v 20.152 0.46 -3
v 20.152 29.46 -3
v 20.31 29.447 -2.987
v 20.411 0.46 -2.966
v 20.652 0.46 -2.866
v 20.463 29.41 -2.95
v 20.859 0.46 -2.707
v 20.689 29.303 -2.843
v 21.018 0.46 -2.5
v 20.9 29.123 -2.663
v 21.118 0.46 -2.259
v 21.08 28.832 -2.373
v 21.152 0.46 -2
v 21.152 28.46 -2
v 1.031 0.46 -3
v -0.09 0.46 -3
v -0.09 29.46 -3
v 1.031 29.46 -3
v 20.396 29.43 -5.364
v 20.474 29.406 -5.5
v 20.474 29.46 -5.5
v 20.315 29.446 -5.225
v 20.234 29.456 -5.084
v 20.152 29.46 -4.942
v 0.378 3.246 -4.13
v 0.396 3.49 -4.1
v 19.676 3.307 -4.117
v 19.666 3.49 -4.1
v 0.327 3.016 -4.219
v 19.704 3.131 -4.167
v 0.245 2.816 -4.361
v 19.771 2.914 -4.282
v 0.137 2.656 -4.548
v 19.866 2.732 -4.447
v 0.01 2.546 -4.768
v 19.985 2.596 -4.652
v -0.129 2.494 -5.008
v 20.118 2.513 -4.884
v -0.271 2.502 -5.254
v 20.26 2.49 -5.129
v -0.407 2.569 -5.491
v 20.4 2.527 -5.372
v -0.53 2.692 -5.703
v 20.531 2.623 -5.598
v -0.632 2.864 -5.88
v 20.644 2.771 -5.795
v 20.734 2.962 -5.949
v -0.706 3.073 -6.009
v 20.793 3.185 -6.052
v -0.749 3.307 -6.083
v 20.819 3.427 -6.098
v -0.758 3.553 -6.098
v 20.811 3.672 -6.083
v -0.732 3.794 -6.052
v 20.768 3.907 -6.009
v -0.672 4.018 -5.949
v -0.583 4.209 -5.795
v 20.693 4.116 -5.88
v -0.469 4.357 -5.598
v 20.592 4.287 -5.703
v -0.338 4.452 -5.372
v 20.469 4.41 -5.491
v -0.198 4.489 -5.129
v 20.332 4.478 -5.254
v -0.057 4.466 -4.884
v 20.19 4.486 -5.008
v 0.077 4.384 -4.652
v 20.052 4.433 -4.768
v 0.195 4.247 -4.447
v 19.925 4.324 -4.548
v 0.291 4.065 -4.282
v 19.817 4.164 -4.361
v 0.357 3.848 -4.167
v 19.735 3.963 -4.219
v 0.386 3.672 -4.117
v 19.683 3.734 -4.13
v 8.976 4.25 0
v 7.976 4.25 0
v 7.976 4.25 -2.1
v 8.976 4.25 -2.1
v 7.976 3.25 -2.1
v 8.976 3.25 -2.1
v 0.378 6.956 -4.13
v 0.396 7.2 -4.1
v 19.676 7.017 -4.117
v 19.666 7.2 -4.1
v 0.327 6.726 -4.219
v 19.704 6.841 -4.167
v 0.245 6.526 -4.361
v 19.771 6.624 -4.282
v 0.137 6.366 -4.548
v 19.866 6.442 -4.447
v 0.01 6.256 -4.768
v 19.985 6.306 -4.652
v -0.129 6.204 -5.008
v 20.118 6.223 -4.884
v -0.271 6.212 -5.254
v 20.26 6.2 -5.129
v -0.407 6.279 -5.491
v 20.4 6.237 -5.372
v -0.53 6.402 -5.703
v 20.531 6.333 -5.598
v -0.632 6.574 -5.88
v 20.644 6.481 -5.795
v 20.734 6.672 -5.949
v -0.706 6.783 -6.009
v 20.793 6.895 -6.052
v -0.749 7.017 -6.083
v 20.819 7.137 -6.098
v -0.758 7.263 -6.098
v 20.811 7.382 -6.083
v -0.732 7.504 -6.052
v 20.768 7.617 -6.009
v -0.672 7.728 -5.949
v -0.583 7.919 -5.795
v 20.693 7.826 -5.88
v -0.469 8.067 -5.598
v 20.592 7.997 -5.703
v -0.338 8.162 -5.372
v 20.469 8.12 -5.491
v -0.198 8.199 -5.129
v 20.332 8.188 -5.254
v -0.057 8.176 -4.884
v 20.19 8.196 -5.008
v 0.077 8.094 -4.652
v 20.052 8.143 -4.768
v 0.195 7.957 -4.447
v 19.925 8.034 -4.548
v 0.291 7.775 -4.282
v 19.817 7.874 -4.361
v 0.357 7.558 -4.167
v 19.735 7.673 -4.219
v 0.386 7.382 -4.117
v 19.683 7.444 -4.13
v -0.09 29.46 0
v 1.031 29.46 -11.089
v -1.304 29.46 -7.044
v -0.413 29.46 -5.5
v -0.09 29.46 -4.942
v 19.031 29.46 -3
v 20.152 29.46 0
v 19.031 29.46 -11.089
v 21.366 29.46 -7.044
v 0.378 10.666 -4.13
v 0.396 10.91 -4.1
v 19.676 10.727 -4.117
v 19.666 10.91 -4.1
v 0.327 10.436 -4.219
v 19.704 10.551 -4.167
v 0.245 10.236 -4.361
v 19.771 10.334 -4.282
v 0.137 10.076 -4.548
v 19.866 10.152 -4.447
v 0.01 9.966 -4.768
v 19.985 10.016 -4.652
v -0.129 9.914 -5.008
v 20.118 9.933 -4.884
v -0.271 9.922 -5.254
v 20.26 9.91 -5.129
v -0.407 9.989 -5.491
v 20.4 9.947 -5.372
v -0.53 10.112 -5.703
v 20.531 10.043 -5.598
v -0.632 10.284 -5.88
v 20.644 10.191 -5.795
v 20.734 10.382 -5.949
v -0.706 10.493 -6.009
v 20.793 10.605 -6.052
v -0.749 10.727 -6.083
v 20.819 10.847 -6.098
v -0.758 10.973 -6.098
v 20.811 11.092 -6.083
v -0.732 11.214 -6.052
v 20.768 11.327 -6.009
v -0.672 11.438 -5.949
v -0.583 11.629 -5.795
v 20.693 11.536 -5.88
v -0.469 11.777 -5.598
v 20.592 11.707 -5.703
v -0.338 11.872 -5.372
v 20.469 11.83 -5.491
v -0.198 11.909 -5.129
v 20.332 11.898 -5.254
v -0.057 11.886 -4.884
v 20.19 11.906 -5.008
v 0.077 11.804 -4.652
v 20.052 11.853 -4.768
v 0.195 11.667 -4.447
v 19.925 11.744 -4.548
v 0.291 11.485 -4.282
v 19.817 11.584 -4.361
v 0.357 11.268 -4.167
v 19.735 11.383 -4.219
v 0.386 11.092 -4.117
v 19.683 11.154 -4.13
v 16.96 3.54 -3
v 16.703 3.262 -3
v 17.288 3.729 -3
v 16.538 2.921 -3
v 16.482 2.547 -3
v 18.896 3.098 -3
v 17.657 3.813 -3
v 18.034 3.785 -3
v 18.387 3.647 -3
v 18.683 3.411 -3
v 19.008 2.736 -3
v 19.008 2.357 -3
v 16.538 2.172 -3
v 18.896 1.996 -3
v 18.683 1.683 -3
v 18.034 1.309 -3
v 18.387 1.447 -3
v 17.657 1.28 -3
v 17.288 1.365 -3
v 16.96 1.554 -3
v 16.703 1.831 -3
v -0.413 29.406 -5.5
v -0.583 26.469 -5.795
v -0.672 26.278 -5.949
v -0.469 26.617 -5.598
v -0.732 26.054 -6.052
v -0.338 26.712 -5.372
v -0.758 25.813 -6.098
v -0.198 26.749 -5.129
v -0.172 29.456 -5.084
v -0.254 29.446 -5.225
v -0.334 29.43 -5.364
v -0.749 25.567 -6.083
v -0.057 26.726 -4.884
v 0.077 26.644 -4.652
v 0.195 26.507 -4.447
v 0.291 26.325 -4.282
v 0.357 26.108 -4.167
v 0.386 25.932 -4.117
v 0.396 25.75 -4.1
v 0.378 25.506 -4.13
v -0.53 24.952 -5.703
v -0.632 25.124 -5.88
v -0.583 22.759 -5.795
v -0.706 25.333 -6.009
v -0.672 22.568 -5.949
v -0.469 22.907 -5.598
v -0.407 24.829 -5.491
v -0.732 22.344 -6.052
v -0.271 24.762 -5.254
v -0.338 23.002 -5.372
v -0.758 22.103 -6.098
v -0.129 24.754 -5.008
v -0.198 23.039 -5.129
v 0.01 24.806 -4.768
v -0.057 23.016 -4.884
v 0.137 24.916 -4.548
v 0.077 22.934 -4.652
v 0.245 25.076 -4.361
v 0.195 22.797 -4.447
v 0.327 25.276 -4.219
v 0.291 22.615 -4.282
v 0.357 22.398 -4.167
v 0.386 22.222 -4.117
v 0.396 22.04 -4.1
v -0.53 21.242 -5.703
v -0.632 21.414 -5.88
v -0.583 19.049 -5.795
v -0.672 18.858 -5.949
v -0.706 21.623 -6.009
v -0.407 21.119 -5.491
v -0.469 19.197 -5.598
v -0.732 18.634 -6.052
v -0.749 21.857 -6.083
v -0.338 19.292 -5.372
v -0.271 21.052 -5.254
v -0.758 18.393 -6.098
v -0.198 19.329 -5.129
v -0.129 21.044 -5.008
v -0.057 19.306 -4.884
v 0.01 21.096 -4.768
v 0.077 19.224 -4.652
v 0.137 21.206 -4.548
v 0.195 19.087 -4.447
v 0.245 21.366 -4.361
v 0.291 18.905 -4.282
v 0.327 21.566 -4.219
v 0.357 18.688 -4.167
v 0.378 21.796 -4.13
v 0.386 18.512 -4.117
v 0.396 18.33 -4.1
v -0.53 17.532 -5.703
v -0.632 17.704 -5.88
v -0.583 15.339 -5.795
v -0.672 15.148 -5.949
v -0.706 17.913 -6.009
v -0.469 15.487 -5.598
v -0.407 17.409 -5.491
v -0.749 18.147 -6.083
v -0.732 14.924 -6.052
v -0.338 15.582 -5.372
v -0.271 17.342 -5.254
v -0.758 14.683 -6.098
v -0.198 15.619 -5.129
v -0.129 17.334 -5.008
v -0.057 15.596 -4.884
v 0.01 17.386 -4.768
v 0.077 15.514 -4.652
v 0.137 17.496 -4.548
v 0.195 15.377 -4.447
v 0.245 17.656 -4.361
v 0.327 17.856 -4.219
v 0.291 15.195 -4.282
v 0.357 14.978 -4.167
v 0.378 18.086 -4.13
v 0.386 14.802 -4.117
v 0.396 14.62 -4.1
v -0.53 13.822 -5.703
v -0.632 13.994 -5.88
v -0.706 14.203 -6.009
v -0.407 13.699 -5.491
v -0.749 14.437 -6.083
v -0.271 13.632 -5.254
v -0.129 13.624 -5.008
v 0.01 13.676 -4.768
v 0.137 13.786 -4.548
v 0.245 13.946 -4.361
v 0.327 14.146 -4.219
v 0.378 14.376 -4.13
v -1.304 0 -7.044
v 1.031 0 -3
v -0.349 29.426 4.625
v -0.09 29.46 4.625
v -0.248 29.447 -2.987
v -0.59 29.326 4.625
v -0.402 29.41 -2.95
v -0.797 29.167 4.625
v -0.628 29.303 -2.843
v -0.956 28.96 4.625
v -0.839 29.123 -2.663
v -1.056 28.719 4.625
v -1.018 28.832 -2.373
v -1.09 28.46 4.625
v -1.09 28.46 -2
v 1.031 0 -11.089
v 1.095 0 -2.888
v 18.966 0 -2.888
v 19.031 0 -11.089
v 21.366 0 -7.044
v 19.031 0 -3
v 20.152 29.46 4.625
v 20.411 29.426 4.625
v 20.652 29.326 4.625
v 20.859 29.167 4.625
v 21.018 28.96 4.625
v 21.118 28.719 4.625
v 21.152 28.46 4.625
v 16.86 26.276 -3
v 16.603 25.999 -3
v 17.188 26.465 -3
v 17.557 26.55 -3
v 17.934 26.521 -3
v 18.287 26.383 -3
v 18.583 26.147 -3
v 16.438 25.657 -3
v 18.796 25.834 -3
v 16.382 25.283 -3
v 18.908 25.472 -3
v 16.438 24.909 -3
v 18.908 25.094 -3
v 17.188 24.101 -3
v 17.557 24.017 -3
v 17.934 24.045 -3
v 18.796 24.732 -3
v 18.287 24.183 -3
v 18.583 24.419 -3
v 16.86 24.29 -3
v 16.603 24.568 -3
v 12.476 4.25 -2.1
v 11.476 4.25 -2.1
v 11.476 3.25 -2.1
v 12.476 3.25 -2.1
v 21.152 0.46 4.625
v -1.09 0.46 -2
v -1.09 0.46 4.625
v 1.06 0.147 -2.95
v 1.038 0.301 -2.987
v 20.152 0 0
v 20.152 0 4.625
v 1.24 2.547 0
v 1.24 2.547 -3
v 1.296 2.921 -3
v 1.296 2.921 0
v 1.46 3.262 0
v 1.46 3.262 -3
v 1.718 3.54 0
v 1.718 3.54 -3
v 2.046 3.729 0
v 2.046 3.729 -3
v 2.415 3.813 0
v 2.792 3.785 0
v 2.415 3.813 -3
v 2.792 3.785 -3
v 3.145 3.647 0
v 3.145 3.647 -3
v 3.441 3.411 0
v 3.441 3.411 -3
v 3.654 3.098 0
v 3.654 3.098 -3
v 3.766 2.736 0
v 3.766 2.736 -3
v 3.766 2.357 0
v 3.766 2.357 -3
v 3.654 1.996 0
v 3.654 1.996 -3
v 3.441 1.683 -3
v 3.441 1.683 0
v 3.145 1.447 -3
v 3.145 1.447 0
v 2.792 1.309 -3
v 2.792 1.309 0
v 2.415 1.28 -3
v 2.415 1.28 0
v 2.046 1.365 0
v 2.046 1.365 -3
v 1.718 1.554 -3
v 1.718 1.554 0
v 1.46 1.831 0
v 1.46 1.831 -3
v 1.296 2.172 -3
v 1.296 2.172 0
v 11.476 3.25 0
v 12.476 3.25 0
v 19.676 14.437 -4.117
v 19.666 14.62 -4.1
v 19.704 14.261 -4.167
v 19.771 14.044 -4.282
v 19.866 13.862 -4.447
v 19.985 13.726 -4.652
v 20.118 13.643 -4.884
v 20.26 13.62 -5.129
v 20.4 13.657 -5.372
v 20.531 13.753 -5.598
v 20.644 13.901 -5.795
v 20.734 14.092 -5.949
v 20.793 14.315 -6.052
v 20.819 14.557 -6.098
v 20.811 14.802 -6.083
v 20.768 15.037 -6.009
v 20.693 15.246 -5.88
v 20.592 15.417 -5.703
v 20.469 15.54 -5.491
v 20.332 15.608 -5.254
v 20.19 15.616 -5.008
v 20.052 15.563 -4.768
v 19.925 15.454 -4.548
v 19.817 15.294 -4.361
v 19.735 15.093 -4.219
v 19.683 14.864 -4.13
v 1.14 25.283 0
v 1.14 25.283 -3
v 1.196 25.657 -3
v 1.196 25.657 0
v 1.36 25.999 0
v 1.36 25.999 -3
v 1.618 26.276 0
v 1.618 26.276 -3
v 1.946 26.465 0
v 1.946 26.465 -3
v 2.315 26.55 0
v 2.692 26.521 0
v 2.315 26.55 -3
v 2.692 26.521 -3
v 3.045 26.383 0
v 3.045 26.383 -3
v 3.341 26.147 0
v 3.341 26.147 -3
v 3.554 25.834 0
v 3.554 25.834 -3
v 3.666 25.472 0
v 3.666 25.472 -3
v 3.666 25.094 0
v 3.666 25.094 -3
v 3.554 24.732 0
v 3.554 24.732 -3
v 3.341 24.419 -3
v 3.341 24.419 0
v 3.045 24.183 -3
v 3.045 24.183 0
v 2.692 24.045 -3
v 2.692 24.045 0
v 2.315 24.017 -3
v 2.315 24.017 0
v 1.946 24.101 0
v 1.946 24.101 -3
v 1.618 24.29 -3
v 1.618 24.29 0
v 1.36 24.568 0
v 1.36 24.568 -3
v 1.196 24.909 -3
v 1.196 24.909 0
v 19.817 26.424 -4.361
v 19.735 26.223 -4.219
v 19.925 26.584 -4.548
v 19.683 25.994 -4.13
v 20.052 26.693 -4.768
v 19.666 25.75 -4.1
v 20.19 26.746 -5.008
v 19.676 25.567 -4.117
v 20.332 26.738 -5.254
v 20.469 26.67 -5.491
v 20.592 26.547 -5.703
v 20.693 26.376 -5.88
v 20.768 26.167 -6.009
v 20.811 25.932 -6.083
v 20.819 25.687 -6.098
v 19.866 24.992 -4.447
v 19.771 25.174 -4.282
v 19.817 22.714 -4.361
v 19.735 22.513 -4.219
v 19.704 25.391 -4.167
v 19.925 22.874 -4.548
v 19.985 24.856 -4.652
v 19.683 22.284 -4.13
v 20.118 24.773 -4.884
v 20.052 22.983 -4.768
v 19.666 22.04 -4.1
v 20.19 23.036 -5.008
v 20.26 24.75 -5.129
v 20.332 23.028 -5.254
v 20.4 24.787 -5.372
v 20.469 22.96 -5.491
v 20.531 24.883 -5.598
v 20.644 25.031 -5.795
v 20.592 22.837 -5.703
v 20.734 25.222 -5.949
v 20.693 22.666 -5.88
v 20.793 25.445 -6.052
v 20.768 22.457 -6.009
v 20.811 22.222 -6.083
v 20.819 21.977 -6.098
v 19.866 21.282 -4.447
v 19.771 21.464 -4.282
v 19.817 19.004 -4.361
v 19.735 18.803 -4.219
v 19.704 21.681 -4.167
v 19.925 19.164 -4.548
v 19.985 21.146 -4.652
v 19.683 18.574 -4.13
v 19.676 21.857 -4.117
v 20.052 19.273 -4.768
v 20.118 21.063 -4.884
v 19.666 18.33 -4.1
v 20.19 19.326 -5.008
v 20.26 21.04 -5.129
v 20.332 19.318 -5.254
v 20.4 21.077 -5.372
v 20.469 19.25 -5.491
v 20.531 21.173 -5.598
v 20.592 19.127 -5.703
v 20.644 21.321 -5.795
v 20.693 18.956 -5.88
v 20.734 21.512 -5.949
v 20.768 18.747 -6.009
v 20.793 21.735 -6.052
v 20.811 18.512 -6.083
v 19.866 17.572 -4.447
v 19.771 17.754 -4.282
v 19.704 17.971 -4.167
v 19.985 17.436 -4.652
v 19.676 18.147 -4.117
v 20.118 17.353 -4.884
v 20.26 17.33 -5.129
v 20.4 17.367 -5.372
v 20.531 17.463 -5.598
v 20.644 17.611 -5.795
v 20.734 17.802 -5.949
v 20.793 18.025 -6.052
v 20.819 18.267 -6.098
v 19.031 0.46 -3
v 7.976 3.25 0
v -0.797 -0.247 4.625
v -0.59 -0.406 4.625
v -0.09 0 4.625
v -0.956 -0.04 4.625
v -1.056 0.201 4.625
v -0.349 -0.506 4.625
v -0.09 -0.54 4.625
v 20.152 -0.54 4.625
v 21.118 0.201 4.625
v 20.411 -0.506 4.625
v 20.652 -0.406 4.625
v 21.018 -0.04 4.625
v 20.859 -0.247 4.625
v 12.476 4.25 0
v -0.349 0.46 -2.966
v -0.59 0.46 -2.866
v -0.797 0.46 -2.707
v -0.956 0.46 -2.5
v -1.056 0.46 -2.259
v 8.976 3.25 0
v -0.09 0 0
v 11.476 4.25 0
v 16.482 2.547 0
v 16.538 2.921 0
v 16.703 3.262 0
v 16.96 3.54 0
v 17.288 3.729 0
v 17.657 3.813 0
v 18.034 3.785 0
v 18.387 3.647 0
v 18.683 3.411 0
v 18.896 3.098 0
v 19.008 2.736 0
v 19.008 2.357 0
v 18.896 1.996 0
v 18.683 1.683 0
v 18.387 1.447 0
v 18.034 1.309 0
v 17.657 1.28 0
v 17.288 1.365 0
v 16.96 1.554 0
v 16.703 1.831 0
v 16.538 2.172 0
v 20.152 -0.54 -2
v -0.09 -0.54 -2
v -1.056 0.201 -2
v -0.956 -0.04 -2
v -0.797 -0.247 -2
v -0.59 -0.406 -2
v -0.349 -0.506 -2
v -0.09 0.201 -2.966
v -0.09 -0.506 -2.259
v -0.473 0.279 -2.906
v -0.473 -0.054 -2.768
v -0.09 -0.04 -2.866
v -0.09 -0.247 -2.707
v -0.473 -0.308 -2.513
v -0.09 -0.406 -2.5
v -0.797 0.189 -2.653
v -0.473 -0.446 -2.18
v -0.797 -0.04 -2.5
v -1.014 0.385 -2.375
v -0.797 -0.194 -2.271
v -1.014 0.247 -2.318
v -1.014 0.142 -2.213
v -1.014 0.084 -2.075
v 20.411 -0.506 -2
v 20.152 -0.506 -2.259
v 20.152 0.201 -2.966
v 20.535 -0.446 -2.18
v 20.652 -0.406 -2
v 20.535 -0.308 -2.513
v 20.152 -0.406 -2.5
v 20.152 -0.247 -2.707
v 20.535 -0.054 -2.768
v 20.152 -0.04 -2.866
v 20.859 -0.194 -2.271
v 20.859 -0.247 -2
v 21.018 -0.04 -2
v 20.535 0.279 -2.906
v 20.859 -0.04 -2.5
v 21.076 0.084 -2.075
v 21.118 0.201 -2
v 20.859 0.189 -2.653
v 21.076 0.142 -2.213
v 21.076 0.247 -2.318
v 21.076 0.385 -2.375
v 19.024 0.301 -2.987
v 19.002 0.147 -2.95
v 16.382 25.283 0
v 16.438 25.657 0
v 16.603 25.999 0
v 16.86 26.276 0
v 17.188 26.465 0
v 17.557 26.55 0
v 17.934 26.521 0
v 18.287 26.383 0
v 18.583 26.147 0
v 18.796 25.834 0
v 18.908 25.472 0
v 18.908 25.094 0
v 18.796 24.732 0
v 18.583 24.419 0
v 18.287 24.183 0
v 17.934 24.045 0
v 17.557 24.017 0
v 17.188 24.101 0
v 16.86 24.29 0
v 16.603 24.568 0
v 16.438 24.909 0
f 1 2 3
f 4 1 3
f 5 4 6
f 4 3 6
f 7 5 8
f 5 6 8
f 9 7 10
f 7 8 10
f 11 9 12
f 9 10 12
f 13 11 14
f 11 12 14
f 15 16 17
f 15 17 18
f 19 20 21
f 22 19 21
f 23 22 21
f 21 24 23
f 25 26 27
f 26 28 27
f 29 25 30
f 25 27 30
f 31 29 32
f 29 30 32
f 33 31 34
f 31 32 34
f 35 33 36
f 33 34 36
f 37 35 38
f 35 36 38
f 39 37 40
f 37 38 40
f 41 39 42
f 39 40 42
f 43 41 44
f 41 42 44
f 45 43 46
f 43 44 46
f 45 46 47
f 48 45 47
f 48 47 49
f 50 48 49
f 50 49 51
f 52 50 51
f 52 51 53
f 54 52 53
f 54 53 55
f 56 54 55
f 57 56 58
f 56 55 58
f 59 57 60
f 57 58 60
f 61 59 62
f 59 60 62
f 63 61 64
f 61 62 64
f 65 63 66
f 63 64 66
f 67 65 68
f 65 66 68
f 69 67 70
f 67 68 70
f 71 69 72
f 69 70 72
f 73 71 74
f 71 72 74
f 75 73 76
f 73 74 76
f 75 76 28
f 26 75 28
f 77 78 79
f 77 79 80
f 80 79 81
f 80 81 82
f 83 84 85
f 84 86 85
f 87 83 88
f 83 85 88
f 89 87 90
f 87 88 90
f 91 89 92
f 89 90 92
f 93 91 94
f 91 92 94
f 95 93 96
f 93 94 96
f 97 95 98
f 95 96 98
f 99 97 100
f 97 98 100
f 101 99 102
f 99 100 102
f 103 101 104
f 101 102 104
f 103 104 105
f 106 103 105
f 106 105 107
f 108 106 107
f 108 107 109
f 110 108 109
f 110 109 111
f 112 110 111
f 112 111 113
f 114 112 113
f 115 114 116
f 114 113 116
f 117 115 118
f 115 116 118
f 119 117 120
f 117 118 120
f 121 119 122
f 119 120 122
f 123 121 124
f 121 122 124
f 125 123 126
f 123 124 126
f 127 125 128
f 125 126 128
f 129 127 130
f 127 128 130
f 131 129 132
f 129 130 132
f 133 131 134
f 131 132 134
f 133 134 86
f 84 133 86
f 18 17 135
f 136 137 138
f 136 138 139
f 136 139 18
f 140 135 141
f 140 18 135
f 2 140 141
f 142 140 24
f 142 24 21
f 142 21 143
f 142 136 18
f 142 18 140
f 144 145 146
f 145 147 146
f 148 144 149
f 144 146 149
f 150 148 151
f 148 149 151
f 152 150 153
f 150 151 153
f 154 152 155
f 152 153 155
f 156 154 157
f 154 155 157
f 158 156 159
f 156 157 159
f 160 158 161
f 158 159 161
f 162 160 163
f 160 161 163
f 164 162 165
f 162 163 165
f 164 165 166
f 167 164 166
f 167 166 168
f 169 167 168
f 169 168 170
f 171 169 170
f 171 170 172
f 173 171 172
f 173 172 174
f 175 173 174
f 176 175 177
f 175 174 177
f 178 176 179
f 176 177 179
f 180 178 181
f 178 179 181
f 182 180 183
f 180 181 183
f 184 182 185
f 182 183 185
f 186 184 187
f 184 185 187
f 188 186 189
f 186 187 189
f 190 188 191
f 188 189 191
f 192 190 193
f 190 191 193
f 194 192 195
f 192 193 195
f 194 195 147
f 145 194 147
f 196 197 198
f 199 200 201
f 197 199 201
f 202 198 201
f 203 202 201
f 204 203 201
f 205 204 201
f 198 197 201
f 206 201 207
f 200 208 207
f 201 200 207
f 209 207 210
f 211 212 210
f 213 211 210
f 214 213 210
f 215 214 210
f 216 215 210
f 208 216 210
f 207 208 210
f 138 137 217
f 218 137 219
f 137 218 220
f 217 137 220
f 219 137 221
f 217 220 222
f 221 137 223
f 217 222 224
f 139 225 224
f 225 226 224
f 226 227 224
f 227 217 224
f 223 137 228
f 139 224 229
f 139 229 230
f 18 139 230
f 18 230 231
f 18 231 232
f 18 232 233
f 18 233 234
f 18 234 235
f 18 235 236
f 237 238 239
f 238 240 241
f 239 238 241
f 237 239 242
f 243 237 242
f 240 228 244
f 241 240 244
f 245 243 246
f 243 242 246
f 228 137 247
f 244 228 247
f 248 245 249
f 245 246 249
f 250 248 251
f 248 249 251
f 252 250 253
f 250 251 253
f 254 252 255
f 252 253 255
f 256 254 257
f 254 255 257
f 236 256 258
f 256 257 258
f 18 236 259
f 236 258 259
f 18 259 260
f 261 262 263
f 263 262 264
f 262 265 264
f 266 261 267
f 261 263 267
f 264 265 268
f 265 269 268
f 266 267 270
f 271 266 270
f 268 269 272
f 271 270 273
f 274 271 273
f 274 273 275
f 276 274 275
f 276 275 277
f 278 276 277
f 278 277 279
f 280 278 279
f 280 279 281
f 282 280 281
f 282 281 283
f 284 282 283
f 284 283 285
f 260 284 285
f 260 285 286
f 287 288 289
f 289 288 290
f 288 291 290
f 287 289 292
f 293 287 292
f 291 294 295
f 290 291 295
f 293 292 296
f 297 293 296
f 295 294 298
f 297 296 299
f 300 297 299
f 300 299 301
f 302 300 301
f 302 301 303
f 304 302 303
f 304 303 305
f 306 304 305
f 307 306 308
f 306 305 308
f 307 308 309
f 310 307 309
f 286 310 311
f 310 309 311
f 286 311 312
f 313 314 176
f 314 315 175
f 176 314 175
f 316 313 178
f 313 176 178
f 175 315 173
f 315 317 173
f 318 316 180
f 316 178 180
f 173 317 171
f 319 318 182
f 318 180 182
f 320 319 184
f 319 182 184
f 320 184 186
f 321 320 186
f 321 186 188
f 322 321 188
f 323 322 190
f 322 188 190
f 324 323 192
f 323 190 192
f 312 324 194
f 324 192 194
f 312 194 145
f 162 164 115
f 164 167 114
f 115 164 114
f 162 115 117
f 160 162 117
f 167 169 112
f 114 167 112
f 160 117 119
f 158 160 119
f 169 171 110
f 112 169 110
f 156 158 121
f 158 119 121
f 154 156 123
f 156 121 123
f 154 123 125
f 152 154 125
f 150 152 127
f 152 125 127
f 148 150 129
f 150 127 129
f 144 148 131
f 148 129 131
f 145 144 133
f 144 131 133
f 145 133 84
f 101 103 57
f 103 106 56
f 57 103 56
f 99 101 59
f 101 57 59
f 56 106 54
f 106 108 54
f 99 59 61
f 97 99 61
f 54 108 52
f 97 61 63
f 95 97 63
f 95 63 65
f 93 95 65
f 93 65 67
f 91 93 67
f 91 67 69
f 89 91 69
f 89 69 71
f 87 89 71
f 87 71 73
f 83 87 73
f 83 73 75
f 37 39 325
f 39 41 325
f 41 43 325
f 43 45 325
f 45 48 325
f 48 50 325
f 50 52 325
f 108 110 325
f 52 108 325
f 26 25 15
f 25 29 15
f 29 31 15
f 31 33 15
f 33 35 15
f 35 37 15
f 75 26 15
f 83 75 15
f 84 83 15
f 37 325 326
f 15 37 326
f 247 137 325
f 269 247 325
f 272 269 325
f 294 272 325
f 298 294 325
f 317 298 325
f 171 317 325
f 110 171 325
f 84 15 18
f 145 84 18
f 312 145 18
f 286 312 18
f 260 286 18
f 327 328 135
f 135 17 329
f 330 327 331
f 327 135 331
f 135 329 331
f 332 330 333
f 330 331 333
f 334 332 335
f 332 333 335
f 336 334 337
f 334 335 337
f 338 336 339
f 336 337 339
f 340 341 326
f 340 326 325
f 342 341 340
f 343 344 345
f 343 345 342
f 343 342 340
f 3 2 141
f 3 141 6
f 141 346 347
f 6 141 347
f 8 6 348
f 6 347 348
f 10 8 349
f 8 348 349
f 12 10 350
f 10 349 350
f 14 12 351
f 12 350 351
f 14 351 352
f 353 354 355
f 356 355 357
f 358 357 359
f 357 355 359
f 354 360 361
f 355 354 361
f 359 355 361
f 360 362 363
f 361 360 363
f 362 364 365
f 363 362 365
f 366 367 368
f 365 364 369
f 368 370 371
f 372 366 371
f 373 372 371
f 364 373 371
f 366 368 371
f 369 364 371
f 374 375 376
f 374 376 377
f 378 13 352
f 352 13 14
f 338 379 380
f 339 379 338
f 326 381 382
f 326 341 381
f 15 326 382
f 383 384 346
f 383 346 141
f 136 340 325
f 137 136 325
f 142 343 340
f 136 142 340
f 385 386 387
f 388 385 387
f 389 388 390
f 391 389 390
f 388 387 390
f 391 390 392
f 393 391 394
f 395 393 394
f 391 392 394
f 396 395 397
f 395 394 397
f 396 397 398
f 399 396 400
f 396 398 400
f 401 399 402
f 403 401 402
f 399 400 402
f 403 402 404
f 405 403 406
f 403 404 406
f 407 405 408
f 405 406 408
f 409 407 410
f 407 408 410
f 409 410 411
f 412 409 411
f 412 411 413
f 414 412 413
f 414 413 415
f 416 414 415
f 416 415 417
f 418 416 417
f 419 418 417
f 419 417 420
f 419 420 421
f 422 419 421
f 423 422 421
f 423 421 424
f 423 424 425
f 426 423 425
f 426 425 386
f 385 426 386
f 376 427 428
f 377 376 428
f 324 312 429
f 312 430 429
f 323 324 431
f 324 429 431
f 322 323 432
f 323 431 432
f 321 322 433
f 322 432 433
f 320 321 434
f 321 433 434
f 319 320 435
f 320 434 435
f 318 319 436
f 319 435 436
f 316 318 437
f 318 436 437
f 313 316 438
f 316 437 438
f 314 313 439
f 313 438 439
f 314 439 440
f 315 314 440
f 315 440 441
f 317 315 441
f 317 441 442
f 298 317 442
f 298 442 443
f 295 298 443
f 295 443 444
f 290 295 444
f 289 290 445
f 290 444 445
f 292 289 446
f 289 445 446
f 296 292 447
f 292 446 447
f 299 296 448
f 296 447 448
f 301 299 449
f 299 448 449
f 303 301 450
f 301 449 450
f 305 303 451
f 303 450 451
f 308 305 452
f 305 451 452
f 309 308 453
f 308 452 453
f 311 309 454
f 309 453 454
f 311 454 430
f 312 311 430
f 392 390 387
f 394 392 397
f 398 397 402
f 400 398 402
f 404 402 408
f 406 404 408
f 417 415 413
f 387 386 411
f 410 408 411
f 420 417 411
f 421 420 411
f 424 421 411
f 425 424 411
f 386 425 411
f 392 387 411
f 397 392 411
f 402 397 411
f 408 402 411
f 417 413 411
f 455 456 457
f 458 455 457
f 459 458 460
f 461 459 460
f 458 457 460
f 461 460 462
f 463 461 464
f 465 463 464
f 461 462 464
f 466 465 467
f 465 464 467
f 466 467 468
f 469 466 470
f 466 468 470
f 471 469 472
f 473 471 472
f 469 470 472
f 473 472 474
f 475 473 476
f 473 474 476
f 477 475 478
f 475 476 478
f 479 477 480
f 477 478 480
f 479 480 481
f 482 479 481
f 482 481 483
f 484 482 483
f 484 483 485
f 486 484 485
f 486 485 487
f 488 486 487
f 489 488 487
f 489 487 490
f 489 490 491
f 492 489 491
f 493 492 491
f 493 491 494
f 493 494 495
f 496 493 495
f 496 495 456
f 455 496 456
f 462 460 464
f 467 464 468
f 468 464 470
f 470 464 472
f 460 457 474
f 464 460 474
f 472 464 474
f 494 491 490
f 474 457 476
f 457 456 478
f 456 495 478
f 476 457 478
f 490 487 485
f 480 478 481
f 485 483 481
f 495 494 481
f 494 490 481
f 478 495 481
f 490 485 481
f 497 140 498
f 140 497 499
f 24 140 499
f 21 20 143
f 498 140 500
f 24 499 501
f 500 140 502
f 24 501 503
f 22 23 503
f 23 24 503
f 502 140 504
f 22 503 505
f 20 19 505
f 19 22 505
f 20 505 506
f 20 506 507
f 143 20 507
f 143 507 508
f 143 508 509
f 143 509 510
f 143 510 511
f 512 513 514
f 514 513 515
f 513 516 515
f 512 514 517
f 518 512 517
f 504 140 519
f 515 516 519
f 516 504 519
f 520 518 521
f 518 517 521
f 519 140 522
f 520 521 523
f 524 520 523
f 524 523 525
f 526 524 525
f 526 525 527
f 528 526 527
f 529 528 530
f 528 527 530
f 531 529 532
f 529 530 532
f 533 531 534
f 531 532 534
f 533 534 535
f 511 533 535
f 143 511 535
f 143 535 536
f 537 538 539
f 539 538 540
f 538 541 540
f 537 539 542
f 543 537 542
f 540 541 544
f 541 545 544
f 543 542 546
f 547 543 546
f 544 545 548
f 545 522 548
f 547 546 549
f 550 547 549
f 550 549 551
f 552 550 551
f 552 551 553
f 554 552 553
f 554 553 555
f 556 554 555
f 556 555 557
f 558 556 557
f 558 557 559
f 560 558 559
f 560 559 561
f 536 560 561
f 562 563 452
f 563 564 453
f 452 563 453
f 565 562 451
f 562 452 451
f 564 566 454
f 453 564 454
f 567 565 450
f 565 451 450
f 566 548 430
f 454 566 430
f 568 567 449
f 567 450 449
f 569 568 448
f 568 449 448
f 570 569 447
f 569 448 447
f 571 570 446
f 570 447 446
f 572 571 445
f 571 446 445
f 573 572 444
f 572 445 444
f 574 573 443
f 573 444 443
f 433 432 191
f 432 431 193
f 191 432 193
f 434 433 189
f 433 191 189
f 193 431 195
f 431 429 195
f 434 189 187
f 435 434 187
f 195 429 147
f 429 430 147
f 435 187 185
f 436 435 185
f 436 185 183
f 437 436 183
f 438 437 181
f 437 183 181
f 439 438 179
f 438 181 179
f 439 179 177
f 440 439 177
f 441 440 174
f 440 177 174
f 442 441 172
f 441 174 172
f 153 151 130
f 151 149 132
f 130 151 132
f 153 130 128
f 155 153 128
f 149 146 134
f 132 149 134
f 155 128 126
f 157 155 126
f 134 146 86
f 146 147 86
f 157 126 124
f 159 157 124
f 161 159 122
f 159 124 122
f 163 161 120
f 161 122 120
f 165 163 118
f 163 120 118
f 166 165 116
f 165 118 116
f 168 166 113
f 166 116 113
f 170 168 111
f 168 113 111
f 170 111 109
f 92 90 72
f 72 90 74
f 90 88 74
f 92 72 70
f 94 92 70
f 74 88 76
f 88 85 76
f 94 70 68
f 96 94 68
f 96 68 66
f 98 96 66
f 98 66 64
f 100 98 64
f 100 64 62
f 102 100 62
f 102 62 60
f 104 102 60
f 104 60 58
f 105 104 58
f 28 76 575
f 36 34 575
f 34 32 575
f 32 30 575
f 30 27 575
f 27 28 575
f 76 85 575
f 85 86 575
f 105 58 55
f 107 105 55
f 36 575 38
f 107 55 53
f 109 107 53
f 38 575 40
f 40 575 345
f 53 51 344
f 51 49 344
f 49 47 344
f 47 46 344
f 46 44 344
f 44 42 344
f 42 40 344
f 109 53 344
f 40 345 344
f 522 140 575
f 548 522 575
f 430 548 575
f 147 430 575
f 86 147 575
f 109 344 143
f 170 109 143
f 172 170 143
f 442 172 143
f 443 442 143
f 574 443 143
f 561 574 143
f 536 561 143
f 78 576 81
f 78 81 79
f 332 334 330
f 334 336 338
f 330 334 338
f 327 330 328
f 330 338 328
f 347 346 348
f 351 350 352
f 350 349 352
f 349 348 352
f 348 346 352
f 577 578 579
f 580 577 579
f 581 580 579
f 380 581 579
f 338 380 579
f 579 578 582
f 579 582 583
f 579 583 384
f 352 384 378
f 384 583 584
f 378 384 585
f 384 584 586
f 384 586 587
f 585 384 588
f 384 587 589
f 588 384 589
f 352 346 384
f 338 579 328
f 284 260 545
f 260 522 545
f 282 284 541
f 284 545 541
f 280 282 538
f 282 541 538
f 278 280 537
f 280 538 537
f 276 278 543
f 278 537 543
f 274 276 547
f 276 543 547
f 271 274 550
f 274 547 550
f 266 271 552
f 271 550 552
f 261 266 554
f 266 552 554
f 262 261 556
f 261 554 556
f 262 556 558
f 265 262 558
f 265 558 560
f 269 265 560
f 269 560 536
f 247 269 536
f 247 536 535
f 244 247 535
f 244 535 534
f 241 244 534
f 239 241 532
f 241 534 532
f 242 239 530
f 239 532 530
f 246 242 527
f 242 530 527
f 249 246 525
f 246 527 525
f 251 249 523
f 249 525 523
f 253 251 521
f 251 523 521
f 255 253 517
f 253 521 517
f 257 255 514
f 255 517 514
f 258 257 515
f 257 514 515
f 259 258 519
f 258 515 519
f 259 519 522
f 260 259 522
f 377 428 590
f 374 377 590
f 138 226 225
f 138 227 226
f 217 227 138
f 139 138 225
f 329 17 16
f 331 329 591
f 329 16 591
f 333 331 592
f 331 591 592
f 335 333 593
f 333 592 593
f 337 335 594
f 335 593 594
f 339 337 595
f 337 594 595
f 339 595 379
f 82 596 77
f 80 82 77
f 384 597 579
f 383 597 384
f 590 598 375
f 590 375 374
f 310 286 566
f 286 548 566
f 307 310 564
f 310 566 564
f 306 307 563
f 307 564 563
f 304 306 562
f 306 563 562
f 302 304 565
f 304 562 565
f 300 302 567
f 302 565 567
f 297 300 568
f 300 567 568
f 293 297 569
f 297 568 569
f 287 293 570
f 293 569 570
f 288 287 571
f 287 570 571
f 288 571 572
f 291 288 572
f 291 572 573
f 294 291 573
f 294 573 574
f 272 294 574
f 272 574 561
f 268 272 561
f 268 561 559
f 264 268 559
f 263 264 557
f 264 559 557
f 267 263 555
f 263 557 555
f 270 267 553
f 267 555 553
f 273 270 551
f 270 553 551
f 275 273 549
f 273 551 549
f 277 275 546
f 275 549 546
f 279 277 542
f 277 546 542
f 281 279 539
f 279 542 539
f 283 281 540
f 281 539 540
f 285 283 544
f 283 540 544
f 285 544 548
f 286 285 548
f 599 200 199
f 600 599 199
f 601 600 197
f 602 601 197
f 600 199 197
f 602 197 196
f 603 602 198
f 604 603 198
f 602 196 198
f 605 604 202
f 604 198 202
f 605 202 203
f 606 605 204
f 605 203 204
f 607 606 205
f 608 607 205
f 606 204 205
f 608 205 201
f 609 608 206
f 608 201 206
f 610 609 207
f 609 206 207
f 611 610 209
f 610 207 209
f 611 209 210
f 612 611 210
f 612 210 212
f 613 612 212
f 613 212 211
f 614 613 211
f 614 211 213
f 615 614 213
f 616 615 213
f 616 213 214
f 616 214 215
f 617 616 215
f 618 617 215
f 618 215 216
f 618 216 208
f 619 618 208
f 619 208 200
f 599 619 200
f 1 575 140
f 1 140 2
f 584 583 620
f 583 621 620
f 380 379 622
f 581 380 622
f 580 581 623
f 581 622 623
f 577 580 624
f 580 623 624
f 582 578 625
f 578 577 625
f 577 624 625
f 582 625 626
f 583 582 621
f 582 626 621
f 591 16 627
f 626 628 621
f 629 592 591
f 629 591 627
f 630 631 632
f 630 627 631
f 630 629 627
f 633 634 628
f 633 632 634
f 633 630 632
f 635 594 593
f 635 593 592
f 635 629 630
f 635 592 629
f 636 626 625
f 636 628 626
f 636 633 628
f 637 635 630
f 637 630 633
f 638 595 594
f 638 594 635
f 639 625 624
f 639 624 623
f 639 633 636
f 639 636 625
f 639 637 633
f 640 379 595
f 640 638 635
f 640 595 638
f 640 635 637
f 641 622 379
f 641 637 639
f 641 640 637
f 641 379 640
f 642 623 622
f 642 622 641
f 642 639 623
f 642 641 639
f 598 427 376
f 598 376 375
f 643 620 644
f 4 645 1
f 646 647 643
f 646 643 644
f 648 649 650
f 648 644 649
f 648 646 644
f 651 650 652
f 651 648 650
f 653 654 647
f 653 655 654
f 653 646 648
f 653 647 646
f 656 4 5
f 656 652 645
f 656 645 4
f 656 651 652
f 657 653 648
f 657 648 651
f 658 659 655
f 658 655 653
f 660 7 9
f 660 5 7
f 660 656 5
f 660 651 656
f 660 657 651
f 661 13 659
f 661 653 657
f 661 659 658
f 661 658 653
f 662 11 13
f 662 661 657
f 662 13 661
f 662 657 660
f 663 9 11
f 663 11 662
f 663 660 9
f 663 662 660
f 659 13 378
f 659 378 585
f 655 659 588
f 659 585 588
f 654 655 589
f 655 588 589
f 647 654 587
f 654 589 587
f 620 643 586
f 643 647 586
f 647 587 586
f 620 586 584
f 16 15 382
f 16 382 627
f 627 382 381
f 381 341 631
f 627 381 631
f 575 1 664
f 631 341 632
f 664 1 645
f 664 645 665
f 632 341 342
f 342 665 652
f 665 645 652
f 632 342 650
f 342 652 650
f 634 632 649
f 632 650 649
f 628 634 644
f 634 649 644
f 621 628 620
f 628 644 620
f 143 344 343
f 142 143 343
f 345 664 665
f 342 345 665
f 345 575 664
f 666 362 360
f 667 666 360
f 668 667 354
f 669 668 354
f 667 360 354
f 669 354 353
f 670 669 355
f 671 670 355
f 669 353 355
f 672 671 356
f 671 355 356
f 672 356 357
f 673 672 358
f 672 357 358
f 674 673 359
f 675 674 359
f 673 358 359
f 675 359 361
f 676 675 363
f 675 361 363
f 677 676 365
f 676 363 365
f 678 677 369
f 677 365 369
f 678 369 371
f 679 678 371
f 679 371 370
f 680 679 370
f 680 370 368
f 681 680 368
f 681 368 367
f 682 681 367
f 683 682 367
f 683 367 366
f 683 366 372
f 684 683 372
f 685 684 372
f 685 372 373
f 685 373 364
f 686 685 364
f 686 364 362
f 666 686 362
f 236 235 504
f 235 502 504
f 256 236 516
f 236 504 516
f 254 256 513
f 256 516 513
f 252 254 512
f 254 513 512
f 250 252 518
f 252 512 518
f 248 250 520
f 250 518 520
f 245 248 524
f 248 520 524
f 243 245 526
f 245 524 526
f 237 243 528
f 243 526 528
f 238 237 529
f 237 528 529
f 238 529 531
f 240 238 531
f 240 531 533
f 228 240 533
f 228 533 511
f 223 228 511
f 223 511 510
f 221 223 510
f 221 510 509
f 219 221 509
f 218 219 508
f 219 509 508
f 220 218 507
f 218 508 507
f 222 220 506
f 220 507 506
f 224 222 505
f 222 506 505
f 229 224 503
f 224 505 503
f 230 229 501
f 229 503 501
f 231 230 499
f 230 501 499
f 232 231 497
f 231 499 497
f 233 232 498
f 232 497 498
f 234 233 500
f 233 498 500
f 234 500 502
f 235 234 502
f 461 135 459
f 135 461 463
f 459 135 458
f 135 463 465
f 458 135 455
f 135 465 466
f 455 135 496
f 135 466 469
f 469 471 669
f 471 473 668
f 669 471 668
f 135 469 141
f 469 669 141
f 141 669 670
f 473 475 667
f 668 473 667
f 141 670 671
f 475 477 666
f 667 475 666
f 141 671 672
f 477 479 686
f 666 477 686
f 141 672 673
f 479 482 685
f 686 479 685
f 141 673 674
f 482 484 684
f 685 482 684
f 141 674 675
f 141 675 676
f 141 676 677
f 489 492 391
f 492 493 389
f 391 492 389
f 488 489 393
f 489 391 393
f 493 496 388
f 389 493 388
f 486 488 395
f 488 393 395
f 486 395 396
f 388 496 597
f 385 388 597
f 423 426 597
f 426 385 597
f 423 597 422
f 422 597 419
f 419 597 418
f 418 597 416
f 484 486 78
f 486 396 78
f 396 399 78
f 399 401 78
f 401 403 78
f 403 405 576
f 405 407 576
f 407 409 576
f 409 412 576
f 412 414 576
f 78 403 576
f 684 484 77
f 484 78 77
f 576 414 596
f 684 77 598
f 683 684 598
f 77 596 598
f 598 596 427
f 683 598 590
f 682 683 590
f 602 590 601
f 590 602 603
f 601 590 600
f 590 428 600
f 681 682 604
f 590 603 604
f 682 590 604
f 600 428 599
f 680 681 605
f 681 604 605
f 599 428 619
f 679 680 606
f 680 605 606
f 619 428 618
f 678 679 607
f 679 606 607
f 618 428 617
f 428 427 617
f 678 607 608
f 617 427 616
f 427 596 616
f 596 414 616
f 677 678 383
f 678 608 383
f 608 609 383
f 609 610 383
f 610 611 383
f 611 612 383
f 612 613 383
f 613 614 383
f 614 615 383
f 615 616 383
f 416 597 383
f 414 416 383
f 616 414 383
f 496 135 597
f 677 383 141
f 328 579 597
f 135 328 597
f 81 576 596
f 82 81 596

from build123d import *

# Parameters (mm, degrees)
BOSS_EXTRUDE1_DEPTH      = 13
BOSS_EXTRUDE1_DEPTH_BACK = 3
SKETCH1_W                = 22.242116592
SKETCH1_H                = 30
SKETCH4_W                = 20.242116592
SKETCH4_H                = 12
CUT_EXTRUDE1_DEPTH       = 33
SKETCH3_W                = 1
SKETCH3_H                = 1
CUT_EXTRUDE2_DEPTH       = 2.1
SKETCH6_R                = 1.27
CUT_EXTRUDE3_DEPTH       = 3.1
BOSS_EXTRUDE3_DEPTH      = 29.459732878
SKETCH8_R                = 1
CUT_EXTRUDE4_DEPTH       = 39.644200609
LPATTERN1_COUNT          = 7
LPATTERN1_PITCH          = 3.71
FILLET2_R                = 1
OPTIONALCUT_DEPTH        = 39.644200609
OPTIONALCUT_DEPTH_BACK   = 39.644200609
SKETCH9_W                = 34.001532977
SKETCH9_H                = 12.141543576


with BuildPart() as part:
    # Sketch1 → Boss-Extrude1 (new, two sides: drawn at the far end of the back side and taken through both)
    with BuildSketch(Plane.XY.offset(-BOSS_EXTRUDE1_DEPTH_BACK)):
        with Locations((10.030822696, 14.459732878)):
            Rectangle(SKETCH1_W, SKETCH1_H)
    extrude(amount=BOSS_EXTRUDE1_DEPTH + BOSS_EXTRUDE1_DEPTH_BACK)

    # Sketch4 → Cut-Extrude1 (cut)
    with BuildSketch(Plane(origin=(0, 0, 0), x_dir=(1, 0, 0), z_dir=(0, 1, 0))):
        with Locations((10.030822696, -6)):
            Rectangle(SKETCH4_W, SKETCH4_H)
    extrude(amount=CUT_EXTRUDE1_DEPTH, mode=Mode.SUBTRACT)

    # Sketch3 → Cut-Extrude2 (cut)
    with BuildSketch(Plane.XY):
        with Locations((11.976170858, 3.750395558)):
            Rectangle(SKETCH3_W, SKETCH3_H)
        with Locations((8.476170858, 3.750395558)):
            Rectangle(SKETCH3_W, SKETCH3_H)
    extrude(amount=-CUT_EXTRUDE2_DEPTH, mode=Mode.SUBTRACT)

    # Sketch6 → Cut-Extrude3 (cut)
    with BuildSketch(Plane(origin=(0, 0, -3), x_dir=(-1, 0, 0), z_dir=(0, 0, -1))):
        with Locations((-17.651880992, 25.283129292)):
            Circle(SKETCH6_R)
        with Locations((-2.4097644, 25.283129292)):
            Circle(SKETCH6_R)
        with Locations((-17.751880992, 2.54676855)):
            Circle(SKETCH6_R)
        with Locations((-2.5097644, 2.54676855)):
            Circle(SKETCH6_R)
    extrude(amount=-CUT_EXTRUDE3_DEPTH, mode=Mode.SUBTRACT)

    # Sketch7 → Boss-Extrude3 (add)
    with BuildSketch(Plane(origin=(0, 0, 0), x_dir=(1, 0, 0), z_dir=(0, 1, 0))):
        Polygon((1.030822696, 3), (19.030822696, 3), (21.365822696, 7.044338636), (19.030822696, 11.088677271), (1.030822696, 11.088677271), (-1.304177304, 7.044338636), align=None)
    extrude(amount=BOSS_EXTRUDE3_DEPTH)

    # Sketch8 → Cut-Extrude4 (cut, symmetric)
    with BuildSketch(Plane(origin=(0, 0, 0), x_dir=(0, 0, -1), z_dir=(1, 0, 0))):
        with Locations(Location((5.1, 25.749732878, 0), (0, 0, 180))):
            Circle(SKETCH8_R)
    cut_extrude4 = extrude(amount=CUT_EXTRUDE4_DEPTH, both=True, mode=Mode.SUBTRACT)

    # LPattern1: Cut-Extrude4 ×7
    with Locations(*[(0, -i * LPATTERN1_PITCH, 0) for i in range(1, LPATTERN1_COUNT)]):
        add(cut_extrude4, mode=Mode.SUBTRACT)

    # Fillet2
    # the kernel refuses this fillet: 1 mm, written as the material it takes off along each edge
    with BuildSketch(Plane(origin=(20.151880992, 0.459732878, -2), x_dir=(0, 0, -1), z_dir=(1, 0, 0))) as fillet2_piece_1_section:
        Polygon((0, 0), (FILLET2_R * 1.02, 0), (FILLET2_R * 1.02, -FILLET2_R * 1.02), (0, -FILLET2_R * 1.02), align=None)
    fillet2_piece_1 = extrude(amount=FILLET2_R * 1.02, mode=Mode.PRIVATE)
    fillet2_piece_1 = fillet2_piece_1 - Plane(origin=(20.151880992, 0.459732878, -2), x_dir=(0, 0.7071067811865475, 0.7071067811865475), z_dir=(1, 0, 0)) * Sphere(FILLET2_R, mode=Mode.PRIVATE)
    add(fillet2_piece_1, mode=Mode.SUBTRACT)
    with BuildSketch(Plane(origin=(-0.0902356, 0.459732878, -2), x_dir=(0, 0, -1), z_dir=(-1, 0, 0))) as fillet2_piece_2_section:
        Polygon((0, 0), (FILLET2_R * 1.02, 0), (FILLET2_R * 1.02, FILLET2_R * 1.02), (0, FILLET2_R * 1.02), align=None)
    fillet2_piece_2 = extrude(amount=FILLET2_R * 1.02, mode=Mode.PRIVATE)
    fillet2_piece_2 = fillet2_piece_2 - Plane(origin=(-0.0902356, 0.459732878, -2), x_dir=(0, 0.7071067811865475, 0.7071067811865475), z_dir=(-1, 0, 0)) * Sphere(FILLET2_R, mode=Mode.PRIVATE)
    add(fillet2_piece_2, mode=Mode.SUBTRACT)
    with BuildSketch(Plane(origin=(20.151880992, 0.459732878, 12), x_dir=(1, 0, 0), z_dir=(0, 0, 1))) as fillet2_piece_3_section:
        Polygon((0, 0), (FILLET2_R * 1.02, 0), (FILLET2_R * 1.02, -FILLET2_R * 1.02), (0, -FILLET2_R * 1.02), align=None)
    fillet2_piece_3 = extrude(amount=FILLET2_R * 1.02, mode=Mode.PRIVATE)
    fillet2_piece_3 = fillet2_piece_3 - Plane(origin=(20.151880992, 0.459732878, 12), x_dir=(-0.7071067811865476, 0.7071067811865475, 0), z_dir=(0, 0, 1)) * Sphere(FILLET2_R, mode=Mode.PRIVATE)
    add(fillet2_piece_3, mode=Mode.SUBTRACT)
    with BuildSketch(Plane(origin=(-0.0902356, 0.459732878, 12), x_dir=(0, -1, 0), z_dir=(0, 0, 1))) as fillet2_piece_4_section:
        Polygon((0, 0), (FILLET2_R * 1.02, 0), (FILLET2_R * 1.02, -FILLET2_R * 1.02), (0, -FILLET2_R * 1.02), align=None)
    fillet2_piece_4 = extrude(amount=FILLET2_R * 1.02, mode=Mode.PRIVATE)
    fillet2_piece_4 = fillet2_piece_4 - Plane(origin=(-0.0902356, 0.459732878, 12), x_dir=(0.7071067811865475, 0.7071067811865477, 0), z_dir=(0, 0, 1)) * Sphere(FILLET2_R, mode=Mode.PRIVATE)
    add(fillet2_piece_4, mode=Mode.SUBTRACT)
    with BuildSketch(Plane(origin=(-0.0902356, 28.459732878, 12), x_dir=(-1, 0, 0), z_dir=(0, 1, 0))) as fillet2_piece_5_section:
        Polygon((0, 0), (FILLET2_R * 1.02, 0), (FILLET2_R * 1.02, FILLET2_R * 1.02), (0, FILLET2_R * 1.02), align=None)
    fillet2_piece_5 = extrude(amount=FILLET2_R * 1.02, mode=Mode.PRIVATE)
    fillet2_piece_5 = fillet2_piece_5 - Plane(origin=(-0.0902356, 28.459732878, 12), x_dir=(0.7071067811865475, 0, -0.7071067811865475), z_dir=(0, 1, 0)) * Sphere(FILLET2_R, mode=Mode.PRIVATE)
    add(fillet2_piece_5, mode=Mode.SUBTRACT)
    with BuildSketch(Plane(origin=(20.151880992, 28.459732878, 12), x_dir=(0, 0, 1), z_dir=(0, 1, 0))) as fillet2_piece_6_section:
        Polygon((0, 0), (FILLET2_R * 1.02, 0), (FILLET2_R * 1.02, FILLET2_R * 1.02), (0, FILLET2_R * 1.02), align=None)
    fillet2_piece_6 = extrude(amount=FILLET2_R * 1.02, mode=Mode.PRIVATE)
    fillet2_piece_6 = fillet2_piece_6 - Plane(origin=(20.151880992, 28.459732878, 12), x_dir=(-0.7071067811865475, 0, -0.7071067811865475), z_dir=(0, 1, 0)) * Sphere(FILLET2_R, mode=Mode.PRIVATE)
    add(fillet2_piece_6, mode=Mode.SUBTRACT)
    with BuildSketch(Plane(origin=(20.151880992, -0.540267122, -3), x_dir=(0, 1, 0), z_dir=(-1, 0, 0))) as fillet2_piece_7_section:
        with BuildLine():
            CenterArc((FILLET2_R, -FILLET2_R), FILLET2_R, 90, 90)
            Line((0, -FILLET2_R), (0, 0))
            Line((0, 0), (FILLET2_R, 0))
        make_face()
    fillet2_piece_7 = extrude(amount=20.242116592, mode=Mode.PRIVATE)
    fillet2_piece_7 = split(fillet2_piece_7, bisect_by=Plane(origin=(19.153997777, 0.112957923, -3.213345499), z_dir=(0.8660254037844363, 0, 0.5000000000000041)), keep=Keep.TOP, mode=Mode.PRIVATE)
    add(fillet2_piece_7, mode=Mode.SUBTRACT)
    with BuildSketch(Plane(origin=(20.151880992, -0.540267122, -3), x_dir=(0, 1, 0), z_dir=(-1, 0, 0))) as fillet2_piece_8_section:
        with BuildLine():
            CenterArc((FILLET2_R, -FILLET2_R), FILLET2_R, 90, 90)
            Line((0, -FILLET2_R), (0, 0))
            Line((0, 0), (FILLET2_R, 0))
        make_face()
    fillet2_piece_8 = extrude(amount=20.242116592, mode=Mode.PRIVATE)
    fillet2_piece_8 = split(fillet2_piece_8, bisect_by=Plane(origin=(10.030822696, 0, -2.762798919), z_dir=(0, -1, 0)), keep=Keep.TOP, mode=Mode.PRIVATE)
    add(fillet2_piece_8, mode=Mode.SUBTRACT)
    with BuildSketch(Plane(origin=(20.151880992, -0.540267122, -3), x_dir=(0, 1, 0), z_dir=(-1, 0, 0))) as fillet2_piece_9_section:
        with BuildLine():
            CenterArc((FILLET2_R, -FILLET2_R), FILLET2_R, 90, 90)
            Line((0, -FILLET2_R), (0, 0))
            Line((0, 0), (FILLET2_R, 0))
        make_face()
    fillet2_piece_9 = extrude(amount=20.242116592, mode=Mode.PRIVATE)
    fillet2_piece_9 = split(fillet2_piece_9, bisect_by=Plane(origin=(0.907647615, 0.112957923, -3.213345499), z_dir=(-0.8660254037844362, 0, 0.5000000000000044)), keep=Keep.TOP, mode=Mode.PRIVATE)
    add(fillet2_piece_9, mode=Mode.SUBTRACT)
    with BuildSketch(Plane(origin=(20.151880992, -0.540267122, 13), x_dir=(0, 1, 0), z_dir=(-1, 0, 0))) as fillet2_piece_10:
        with BuildLine():
            CenterArc((FILLET2_R, FILLET2_R), FILLET2_R, 180, 90)
            Line((0, FILLET2_R), (0, 0))
            Line((0, 0), (FILLET2_R, 0))
        make_face()
    extrude(amount=20.242116592, mode=Mode.SUBTRACT)
    with BuildSketch(Plane(origin=(-1.0902356, 0.459732878, -3), x_dir=(1, 0, 0), z_dir=(0, 1, 0))) as fillet2_piece_11:
        with BuildLine():
            CenterArc((FILLET2_R, -FILLET2_R), FILLET2_R, 90, 90)
            Line((0, -FILLET2_R), (0, 0))
            Line((0, 0), (FILLET2_R, 0))
        make_face()
    extrude(amount=31.5, mode=Mode.SUBTRACT)
    with BuildSketch(Plane(origin=(-1.0902356, 29.459732878, -5.5), x_dir=(1, 0, 0), z_dir=(0, 0, 1))) as fillet2_piece_12_section:
        with BuildLine():
            CenterArc((FILLET2_R, -FILLET2_R), FILLET2_R, 90, 90)
            Line((0, -FILLET2_R), (0, 0))
            Line((0, 0), (FILLET2_R, 0))
        make_face()
    fillet2_piece_12 = extrude(amount=17.5, mode=Mode.PRIVATE)
    fillet2_piece_12 = split(fillet2_piece_12, bisect_by=Plane(origin=(1.20591916, 29.236364939, -2.696724029), z_dir=(-0.8660254037844362, 0, 0.5000000000000044)), keep=Keep.TOP, mode=Mode.PRIVATE)
    add(fillet2_piece_12, mode=Mode.SUBTRACT)
    with BuildSketch(Plane(origin=(-1.0902356, 0.459732878, 13), x_dir=(1, 0, 0), z_dir=(0, 1, 0)), Plane(origin=(21.151880992, 28.459732878, 13), x_dir=(-1, 0, 0), z_dir=(0, -1, 0))) as fillet2_piece_13:
        with BuildLine():
            CenterArc((FILLET2_R, FILLET2_R), FILLET2_R, 180, 90)
            Line((0, FILLET2_R), (0, 0))
            Line((0, 0), (FILLET2_R, 0))
        make_face()
    extrude(amount=28, mode=Mode.SUBTRACT)
    with BuildSketch(Plane(origin=(-1.0902356, -0.540267122, -2), x_dir=(0, 1, 0), z_dir=(0, 0, 1)), Plane(origin=(21.151880992, -0.540267122, 12), x_dir=(0, 1, 0), z_dir=(0, 0, -1))) as fillet2_piece_14:
        with BuildLine():
            CenterArc((FILLET2_R, -FILLET2_R), FILLET2_R, 90, 90)
            Line((0, -FILLET2_R), (0, 0))
            Line((0, 0), (FILLET2_R, 0))
        make_face()
    extrude(amount=14, mode=Mode.SUBTRACT)
    with BuildSketch(Plane(origin=(21.151880992, 31.959732878, -3), x_dir=(0, 0, 1), z_dir=(0, -1, 0))) as fillet2_piece_15:
        with BuildLine():
            CenterArc((FILLET2_R, FILLET2_R), FILLET2_R, 180, 90)
            Line((0, FILLET2_R), (0, 0))
            Line((0, 0), (FILLET2_R, 0))
        make_face()
    extrude(amount=31.5, mode=Mode.SUBTRACT)
    with BuildSketch(Plane(origin=(21.151880992, 29.459732878, 12), x_dir=(-1, 0, 0), z_dir=(0, 0, -1))) as fillet2_piece_16_section:
        with BuildLine():
            CenterArc((FILLET2_R, -FILLET2_R), FILLET2_R, 90, 90)
            Line((0, -FILLET2_R), (0, 0))
            Line((0, 0), (FILLET2_R, 0))
        make_face()
    fillet2_piece_16 = extrude(amount=17.5, mode=Mode.PRIVATE)
    fillet2_piece_16 = split(fillet2_piece_16, bisect_by=Plane(origin=(15.608130968, 29.236364939, 2.928275971), z_dir=(0.8660254037844363, 0, 0.5000000000000041)), keep=Keep.TOP, mode=Mode.PRIVATE)
    add(fillet2_piece_16, mode=Mode.SUBTRACT)
    with BuildSketch(Plane(origin=(-0.0902356, 29.459732878, 13), x_dir=(0, 0, -1), z_dir=(1, 0, 0))) as fillet2_piece_17:
        with BuildLine():
            CenterArc((FILLET2_R, -FILLET2_R), FILLET2_R, 90, 90)
            Line((0, -FILLET2_R), (0, 0))
            Line((0, 0), (FILLET2_R, 0))
        make_face()
    extrude(amount=20.242116592, mode=Mode.SUBTRACT)

    # Sketch9 → OptionalCut (cut, two sides: drawn at the far end of the back side and taken through both)
    with BuildSketch(Plane(origin=(0, 0, 0), x_dir=(1, 0, 0), z_dir=(0, 1, 0)).offset(-OPTIONALCUT_DEPTH_BACK)):
        with Locations((10.877994957, -10.695825978)):
            Rectangle(SKETCH9_W, SKETCH9_H)
    extrude(amount=OPTIONALCUT_DEPTH + OPTIONALCUT_DEPTH_BACK, mode=Mode.SUBTRACT)


solid = part.part
